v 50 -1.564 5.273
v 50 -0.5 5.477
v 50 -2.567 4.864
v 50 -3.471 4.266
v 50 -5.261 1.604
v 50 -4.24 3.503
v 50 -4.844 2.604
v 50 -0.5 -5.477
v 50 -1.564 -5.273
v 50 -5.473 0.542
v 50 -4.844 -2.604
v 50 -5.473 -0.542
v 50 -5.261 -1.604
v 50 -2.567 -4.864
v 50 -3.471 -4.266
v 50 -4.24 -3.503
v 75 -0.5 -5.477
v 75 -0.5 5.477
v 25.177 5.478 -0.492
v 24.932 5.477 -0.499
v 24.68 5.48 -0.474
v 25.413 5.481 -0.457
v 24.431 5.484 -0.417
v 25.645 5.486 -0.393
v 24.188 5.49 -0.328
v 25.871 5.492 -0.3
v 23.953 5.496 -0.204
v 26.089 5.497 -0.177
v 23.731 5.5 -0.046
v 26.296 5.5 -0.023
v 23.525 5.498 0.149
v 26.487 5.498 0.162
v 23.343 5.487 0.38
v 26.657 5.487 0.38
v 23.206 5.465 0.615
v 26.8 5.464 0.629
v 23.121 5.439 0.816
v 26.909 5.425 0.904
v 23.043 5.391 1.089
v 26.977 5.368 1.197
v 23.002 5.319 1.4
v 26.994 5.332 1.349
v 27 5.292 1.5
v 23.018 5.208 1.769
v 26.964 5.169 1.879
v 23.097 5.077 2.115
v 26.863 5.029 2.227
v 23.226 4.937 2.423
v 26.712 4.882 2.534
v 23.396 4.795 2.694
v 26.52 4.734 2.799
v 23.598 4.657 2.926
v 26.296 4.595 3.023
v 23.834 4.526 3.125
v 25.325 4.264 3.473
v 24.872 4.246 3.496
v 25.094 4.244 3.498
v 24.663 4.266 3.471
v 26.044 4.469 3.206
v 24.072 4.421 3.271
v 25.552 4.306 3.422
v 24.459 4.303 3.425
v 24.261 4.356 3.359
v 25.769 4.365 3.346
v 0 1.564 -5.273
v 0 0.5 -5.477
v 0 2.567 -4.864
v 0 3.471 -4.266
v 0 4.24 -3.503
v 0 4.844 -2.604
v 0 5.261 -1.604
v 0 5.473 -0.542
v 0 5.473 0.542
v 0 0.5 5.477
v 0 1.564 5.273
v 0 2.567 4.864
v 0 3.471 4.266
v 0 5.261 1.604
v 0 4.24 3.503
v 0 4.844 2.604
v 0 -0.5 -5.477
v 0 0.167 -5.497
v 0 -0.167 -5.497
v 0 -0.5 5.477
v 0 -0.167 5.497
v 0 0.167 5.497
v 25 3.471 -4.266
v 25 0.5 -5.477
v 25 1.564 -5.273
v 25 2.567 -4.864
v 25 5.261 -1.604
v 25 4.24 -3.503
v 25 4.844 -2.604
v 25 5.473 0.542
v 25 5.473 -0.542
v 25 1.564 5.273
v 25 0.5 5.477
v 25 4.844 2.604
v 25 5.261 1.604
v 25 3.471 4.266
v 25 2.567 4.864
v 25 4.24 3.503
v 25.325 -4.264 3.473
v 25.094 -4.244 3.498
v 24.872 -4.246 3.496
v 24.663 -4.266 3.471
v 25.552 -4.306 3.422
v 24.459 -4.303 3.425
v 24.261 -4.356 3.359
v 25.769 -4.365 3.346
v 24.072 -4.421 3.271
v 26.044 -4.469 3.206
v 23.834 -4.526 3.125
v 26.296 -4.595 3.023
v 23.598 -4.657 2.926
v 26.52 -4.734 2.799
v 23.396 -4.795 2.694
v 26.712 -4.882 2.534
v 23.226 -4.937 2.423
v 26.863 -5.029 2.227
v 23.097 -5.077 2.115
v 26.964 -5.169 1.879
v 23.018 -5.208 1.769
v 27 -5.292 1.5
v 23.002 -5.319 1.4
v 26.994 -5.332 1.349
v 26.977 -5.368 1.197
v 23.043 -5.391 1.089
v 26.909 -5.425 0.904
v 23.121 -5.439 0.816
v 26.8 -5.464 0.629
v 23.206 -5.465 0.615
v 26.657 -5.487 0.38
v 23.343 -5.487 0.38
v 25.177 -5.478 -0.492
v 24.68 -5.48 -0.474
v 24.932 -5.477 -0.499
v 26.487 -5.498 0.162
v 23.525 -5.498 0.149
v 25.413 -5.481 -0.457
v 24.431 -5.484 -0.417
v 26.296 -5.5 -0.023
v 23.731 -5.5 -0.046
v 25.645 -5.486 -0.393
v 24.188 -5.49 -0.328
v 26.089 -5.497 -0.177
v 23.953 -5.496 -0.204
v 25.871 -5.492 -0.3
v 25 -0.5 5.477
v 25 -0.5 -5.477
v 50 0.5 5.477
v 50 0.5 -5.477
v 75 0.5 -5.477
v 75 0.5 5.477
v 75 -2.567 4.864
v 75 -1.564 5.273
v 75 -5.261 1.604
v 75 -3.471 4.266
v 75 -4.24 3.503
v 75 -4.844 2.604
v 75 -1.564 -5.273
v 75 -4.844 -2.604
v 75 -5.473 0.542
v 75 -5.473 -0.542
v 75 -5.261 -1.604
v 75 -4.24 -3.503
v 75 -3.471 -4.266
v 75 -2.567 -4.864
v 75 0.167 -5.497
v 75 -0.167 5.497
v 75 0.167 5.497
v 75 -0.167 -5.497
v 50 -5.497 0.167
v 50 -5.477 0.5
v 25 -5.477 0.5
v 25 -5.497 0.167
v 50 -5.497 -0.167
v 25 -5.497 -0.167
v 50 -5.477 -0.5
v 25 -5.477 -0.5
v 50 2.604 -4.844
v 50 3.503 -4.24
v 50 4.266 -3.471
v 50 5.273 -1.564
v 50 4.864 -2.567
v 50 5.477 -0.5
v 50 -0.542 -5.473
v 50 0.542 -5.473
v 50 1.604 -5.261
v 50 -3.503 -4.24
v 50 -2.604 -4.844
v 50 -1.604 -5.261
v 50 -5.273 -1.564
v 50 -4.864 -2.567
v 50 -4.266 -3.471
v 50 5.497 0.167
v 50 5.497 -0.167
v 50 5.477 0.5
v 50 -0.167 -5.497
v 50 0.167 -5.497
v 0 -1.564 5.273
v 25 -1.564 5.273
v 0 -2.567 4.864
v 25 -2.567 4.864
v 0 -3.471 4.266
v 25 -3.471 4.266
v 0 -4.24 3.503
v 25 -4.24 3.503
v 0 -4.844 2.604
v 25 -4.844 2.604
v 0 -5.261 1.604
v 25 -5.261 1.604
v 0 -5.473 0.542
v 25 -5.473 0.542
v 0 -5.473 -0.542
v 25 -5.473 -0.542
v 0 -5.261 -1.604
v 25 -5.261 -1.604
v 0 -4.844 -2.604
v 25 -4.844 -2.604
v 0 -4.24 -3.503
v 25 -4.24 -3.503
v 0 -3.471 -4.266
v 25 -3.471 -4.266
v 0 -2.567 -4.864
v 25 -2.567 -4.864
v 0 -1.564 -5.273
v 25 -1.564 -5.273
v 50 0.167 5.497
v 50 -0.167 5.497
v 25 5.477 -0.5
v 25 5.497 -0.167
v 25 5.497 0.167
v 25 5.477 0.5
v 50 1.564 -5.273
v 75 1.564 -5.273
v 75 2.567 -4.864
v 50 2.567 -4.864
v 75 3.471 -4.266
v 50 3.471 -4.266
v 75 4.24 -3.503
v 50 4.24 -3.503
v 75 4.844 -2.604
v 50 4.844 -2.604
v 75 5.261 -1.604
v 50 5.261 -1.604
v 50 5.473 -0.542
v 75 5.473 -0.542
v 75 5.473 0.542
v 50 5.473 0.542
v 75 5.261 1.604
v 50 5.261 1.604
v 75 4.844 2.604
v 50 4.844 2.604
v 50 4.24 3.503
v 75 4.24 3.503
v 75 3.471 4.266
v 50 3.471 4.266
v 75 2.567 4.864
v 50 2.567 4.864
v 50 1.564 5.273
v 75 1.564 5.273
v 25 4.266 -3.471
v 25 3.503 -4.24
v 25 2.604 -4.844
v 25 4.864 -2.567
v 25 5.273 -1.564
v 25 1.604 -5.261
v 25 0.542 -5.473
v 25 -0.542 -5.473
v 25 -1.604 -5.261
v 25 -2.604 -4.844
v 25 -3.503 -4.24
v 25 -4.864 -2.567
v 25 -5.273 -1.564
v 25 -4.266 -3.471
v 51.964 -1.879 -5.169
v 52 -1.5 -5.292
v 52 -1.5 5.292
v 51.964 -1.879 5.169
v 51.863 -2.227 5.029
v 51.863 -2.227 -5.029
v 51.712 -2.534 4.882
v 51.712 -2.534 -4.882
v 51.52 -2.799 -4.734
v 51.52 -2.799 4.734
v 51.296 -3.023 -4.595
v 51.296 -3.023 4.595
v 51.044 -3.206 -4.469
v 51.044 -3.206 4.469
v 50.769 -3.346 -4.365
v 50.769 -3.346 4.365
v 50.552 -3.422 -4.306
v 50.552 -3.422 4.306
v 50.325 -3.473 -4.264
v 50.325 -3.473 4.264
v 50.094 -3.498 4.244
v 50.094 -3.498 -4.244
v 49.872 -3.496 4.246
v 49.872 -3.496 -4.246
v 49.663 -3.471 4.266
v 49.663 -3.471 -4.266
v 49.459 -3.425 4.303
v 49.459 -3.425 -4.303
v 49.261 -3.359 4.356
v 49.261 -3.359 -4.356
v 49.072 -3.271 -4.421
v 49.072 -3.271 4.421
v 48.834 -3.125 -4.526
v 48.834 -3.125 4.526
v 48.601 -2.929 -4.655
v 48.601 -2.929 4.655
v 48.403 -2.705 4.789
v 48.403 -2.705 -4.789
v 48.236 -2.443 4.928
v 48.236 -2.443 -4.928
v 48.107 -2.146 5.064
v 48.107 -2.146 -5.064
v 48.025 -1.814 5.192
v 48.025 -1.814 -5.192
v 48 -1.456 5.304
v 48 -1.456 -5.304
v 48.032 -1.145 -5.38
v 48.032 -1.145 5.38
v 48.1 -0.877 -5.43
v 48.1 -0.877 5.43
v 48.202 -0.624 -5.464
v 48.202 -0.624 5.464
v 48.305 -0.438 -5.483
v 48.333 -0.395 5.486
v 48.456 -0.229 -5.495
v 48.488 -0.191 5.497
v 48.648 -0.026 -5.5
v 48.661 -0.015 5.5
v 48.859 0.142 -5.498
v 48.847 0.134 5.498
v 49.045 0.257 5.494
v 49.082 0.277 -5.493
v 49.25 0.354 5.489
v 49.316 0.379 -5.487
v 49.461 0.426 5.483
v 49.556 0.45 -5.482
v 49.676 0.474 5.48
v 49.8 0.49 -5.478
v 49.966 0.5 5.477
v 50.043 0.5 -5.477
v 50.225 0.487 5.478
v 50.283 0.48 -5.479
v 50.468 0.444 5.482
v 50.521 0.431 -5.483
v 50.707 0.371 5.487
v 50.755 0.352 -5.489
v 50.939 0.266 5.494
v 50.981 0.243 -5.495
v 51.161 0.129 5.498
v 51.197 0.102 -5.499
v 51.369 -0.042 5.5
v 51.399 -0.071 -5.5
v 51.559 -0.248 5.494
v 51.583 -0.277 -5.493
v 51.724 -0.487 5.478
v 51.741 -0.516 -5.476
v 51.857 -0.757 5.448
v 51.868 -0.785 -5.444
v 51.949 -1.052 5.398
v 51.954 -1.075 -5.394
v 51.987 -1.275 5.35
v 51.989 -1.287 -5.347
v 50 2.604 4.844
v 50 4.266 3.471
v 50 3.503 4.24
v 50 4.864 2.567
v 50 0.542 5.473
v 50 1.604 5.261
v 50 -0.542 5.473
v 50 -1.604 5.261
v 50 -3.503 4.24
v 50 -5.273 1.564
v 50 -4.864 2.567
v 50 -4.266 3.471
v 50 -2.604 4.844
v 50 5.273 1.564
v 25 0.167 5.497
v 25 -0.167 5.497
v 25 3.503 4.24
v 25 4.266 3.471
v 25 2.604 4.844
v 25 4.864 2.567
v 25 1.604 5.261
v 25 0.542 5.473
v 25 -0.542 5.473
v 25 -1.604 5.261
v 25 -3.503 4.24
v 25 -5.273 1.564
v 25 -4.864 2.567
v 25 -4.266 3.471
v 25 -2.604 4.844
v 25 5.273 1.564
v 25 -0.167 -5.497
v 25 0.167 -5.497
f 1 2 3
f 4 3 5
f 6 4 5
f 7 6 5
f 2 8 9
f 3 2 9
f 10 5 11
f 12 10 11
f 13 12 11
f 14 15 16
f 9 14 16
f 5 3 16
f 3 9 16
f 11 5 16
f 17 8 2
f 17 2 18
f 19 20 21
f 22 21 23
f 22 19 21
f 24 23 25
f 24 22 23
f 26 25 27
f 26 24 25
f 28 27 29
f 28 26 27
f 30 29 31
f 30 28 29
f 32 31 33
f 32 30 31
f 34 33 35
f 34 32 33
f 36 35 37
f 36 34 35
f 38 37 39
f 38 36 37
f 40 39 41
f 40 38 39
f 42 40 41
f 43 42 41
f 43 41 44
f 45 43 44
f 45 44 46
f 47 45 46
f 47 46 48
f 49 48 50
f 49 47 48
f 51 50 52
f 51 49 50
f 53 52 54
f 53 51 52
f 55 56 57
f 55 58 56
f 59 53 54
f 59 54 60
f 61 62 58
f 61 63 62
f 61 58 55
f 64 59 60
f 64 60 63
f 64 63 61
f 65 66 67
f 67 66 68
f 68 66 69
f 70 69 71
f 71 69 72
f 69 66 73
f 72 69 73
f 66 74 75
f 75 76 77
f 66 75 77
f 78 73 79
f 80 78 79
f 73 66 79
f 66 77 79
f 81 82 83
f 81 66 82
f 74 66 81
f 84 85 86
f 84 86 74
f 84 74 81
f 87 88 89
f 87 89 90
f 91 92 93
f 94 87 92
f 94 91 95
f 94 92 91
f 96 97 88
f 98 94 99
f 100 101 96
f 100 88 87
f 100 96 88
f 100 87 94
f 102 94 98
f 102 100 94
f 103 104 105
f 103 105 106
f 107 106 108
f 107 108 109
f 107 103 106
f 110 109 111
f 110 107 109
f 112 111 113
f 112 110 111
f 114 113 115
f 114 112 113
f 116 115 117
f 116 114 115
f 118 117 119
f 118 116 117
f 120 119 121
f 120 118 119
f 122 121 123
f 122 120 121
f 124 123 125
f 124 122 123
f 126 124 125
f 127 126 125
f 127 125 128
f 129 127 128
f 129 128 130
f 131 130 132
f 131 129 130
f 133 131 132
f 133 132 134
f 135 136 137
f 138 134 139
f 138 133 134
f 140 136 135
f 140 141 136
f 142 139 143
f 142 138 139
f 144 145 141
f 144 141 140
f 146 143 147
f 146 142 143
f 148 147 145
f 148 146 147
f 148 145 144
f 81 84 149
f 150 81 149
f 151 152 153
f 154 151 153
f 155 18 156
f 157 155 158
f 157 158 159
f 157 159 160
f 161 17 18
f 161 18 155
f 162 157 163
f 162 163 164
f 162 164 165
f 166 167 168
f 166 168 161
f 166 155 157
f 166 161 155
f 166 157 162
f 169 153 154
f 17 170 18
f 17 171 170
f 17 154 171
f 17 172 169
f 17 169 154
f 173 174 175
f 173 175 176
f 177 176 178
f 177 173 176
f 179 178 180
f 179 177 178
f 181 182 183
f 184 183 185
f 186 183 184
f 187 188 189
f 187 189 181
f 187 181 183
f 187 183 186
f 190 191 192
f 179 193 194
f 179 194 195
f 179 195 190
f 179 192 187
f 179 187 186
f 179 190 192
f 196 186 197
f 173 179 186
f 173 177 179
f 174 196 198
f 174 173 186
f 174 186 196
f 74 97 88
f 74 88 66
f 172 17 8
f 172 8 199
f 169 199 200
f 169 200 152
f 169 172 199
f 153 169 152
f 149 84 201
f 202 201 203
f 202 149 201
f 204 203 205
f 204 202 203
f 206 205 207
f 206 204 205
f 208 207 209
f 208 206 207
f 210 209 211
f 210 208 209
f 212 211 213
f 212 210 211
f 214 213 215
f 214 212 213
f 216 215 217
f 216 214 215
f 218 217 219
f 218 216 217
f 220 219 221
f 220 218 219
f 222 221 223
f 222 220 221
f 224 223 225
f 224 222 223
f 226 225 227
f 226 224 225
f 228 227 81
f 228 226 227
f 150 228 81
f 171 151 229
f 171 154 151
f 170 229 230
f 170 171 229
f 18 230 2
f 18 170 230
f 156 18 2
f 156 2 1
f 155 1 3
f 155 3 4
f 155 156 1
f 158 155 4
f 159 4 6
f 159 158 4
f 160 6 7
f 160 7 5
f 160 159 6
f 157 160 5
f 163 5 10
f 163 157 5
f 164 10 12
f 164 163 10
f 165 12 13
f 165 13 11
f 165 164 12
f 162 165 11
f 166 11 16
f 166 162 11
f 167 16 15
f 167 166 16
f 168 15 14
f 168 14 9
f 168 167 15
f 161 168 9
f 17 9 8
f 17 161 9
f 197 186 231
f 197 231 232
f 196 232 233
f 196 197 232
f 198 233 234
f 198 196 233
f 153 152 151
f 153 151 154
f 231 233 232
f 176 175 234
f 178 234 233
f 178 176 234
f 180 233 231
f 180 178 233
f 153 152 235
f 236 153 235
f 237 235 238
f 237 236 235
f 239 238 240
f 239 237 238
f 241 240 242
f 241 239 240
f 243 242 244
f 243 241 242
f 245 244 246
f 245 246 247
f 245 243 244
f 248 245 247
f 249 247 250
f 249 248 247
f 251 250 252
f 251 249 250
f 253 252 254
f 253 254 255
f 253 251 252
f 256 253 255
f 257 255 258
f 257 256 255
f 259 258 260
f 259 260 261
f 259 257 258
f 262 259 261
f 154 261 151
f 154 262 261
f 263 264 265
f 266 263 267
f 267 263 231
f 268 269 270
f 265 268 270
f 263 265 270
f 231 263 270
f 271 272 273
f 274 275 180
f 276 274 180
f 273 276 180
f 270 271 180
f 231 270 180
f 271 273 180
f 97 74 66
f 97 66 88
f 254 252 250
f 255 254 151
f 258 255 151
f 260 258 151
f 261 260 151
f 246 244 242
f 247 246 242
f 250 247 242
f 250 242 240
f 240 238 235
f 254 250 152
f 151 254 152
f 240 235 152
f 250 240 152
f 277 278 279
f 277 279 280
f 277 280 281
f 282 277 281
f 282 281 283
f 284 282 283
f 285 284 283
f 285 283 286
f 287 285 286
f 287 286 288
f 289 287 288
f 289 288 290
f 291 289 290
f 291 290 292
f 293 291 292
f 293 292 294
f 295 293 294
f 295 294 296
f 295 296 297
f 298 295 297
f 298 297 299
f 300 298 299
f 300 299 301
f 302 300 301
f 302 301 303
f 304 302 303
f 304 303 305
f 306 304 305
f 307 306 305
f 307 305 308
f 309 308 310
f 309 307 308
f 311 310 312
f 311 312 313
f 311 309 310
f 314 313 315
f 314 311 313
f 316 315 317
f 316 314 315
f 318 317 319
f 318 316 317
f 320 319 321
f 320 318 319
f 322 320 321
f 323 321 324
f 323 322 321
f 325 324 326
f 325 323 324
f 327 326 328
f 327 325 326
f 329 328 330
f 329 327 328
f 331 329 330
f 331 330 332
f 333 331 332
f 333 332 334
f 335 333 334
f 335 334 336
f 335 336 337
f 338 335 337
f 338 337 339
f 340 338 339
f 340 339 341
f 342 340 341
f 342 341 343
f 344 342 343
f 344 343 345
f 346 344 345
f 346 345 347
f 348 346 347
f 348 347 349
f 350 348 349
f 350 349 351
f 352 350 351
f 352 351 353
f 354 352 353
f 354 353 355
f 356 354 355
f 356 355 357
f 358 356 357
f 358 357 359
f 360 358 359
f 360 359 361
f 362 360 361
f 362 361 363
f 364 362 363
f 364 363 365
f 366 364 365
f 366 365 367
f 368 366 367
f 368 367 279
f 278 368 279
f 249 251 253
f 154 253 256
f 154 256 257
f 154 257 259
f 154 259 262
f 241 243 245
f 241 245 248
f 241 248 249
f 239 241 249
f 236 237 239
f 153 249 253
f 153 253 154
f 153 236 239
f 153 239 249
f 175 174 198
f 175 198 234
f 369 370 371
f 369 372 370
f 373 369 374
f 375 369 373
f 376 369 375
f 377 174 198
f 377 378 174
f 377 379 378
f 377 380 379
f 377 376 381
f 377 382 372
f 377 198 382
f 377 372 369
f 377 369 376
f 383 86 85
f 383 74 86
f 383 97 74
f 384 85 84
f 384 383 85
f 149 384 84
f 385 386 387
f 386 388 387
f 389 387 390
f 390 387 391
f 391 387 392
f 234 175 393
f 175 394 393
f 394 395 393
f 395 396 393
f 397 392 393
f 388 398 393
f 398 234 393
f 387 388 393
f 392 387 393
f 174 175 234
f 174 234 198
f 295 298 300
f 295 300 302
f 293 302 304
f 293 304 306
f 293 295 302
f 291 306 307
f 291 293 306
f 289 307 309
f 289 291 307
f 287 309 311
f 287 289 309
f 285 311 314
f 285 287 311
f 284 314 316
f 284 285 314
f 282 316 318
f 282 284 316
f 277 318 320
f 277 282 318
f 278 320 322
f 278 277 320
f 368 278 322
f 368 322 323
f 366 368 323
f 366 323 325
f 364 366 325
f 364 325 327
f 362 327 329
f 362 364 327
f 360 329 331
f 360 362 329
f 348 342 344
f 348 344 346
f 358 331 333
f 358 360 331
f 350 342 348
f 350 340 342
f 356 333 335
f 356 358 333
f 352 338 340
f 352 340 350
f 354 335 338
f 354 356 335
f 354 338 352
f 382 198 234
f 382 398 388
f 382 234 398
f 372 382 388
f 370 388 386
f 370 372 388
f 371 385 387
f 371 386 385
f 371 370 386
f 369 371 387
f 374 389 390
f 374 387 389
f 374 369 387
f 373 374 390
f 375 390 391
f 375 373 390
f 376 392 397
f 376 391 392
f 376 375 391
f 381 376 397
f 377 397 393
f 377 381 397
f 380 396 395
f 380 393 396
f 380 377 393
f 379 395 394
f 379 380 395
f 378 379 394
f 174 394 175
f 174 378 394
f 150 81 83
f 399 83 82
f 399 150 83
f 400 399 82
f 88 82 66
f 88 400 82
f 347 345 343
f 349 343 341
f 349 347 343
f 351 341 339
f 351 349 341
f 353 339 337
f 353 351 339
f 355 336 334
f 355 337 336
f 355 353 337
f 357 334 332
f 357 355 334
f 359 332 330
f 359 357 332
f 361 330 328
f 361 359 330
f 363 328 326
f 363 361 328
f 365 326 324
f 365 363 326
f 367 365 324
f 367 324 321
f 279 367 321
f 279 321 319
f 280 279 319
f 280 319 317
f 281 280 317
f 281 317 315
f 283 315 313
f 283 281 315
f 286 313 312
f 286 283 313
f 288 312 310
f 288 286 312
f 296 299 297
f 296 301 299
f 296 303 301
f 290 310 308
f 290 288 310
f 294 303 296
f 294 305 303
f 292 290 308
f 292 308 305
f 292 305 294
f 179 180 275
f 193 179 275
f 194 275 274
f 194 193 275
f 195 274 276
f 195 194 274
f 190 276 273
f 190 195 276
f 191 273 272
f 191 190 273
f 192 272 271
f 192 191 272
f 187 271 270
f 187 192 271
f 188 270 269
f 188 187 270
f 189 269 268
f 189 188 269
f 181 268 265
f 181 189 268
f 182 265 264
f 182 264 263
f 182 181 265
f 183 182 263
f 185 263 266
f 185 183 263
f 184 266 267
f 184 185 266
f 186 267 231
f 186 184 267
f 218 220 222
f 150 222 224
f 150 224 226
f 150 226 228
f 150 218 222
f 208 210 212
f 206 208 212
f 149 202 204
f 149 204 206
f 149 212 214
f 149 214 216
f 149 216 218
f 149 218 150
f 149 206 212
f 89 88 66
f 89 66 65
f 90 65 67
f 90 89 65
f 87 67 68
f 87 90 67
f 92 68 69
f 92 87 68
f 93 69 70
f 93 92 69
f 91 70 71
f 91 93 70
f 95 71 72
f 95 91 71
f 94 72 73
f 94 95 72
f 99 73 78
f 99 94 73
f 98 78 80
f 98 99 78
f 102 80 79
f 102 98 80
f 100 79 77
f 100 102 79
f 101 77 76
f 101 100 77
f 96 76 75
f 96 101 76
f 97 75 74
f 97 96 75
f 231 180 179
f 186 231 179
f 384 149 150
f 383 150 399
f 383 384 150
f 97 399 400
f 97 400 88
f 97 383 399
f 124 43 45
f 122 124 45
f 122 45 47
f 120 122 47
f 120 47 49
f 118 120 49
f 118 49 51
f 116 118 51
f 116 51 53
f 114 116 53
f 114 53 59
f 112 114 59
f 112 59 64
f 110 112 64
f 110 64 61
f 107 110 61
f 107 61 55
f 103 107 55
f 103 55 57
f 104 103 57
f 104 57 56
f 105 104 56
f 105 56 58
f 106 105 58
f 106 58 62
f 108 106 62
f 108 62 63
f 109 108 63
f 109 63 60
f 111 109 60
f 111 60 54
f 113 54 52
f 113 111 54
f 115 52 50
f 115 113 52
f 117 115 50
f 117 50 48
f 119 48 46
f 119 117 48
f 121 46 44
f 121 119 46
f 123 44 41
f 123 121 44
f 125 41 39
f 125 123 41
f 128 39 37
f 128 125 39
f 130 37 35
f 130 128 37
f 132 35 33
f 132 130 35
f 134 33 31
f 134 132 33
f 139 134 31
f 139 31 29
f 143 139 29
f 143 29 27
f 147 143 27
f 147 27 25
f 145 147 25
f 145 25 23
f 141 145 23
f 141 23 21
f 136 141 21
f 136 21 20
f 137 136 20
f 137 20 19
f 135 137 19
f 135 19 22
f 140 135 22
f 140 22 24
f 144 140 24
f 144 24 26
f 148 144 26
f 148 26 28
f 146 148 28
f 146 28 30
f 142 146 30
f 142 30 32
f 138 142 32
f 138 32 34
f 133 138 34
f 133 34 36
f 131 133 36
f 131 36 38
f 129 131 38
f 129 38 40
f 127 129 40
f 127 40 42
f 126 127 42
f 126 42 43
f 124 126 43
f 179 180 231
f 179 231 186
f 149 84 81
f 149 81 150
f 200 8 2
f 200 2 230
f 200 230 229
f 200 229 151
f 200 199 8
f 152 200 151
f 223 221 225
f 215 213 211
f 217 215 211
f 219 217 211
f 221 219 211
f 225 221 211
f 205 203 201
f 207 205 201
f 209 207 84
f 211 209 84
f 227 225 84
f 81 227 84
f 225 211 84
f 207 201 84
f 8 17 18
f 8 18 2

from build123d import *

# Parameters (mm, degrees)
F0_W     = 25
F0_H     = 9.5
F1_DEPTH = 10
F2_DEPTH = 10
F5_ANGLE = 90
F6_R     = 2
F7_DEPTH = 20
F9_ANGLE = 90
F10_W    = 77
F10_H    = 5.5


with BuildPart() as f1:
    # F0 (on Top) → F1 (new body, symmetric)
    with BuildSketch(Plane.XY):
        with Locations((12.5, -5.25)):
            Rectangle(F0_W, F0_H)
    extrude(amount=F1_DEPTH, both=True)


with BuildPart() as f1b:
    # F0 (on Top) → F1, piece 2 (new body, symmetric)
    with BuildSketch(Plane.XY):
        with Locations((12.5, 5.25)):
            Rectangle(F0_W, F0_H)
    extrude(amount=F1_DEPTH, both=True)


with BuildPart() as f2:
    # F0 (on Top) → F2 (new body, symmetric)
    with BuildSketch(Plane.XY):
        Polygon((0, 0.5), (0, 0), (0, -0.5), (25, -0.5), (25, 0.5), align=None)
    extrude(amount=F2_DEPTH, both=True)


with BuildPart() as f3_1:
    # F3: copy of F1
    add(f1.part.moved(Location((25, 0, 0))))


with BuildPart() as f3_2:
    # F3: copy of F1b
    add(f1b.part.moved(Location((25, 0, 0))))


with BuildPart() as f3_3:
    # F3: copy of F2
    add(f2.part.moved(Location((25, 0, 0))))


with BuildPart() as f3_2_1:
    # F5: moved
    add(f3_2.part.rotate(Axis((36.7808852345, 0, 0), (1, 0, 0)), F5_ANGLE))


with BuildPart() as f3_3_1:
    # F5: moved
    add(f3_3.part.rotate(Axis((36.7808852345, 0, 0), (1, 0, 0)), F5_ANGLE))


with BuildPart() as f3_1_1:
    # F5: moved
    add(f3_1.part.rotate(Axis((36.7808852345, 0, 0), (1, 0, 0)), F5_ANGLE))


with BuildPart() as f7:
    # F6 (on face) → F7 (new body)
    with BuildSketch(Plane.XZ.offset(10)):
        with Locations((25, 1.5)):
            Circle(F6_R)
    extrude(amount=-F7_DEPTH)


with BuildPart() as f8_1:
    # F8: copy of F3_2
    add(f3_2_1.part.moved(Location((25, 0, 0))))


with BuildPart() as f8_2:
    # F8: copy of F3_3
    add(f3_3_1.part.moved(Location((25, 0, 0))))


with BuildPart() as f8_3:
    # F8: copy of F3_1
    add(f3_1_1.part.moved(Location((25, 0, 0))))


with BuildPart() as f8_4:
    # F8: copy of F7
    add(f7.part.moved(Location((25, 0, 0))))


with BuildPart() as f8_4_1:
    # F9: moved
    add(f8_4.part.rotate(Axis((36.7808852345, 0, 0), (1, 0, 0)), F9_ANGLE))


with BuildPart() as f8_1_1:
    # F9: moved
    add(f8_1.part.rotate(Axis((36.7808852345, 0, 0), (1, 0, 0)), F9_ANGLE))


with BuildPart() as f8_2_1:
    # F9: moved
    add(f8_2.part.rotate(Axis((36.7808852345, 0, 0), (1, 0, 0)), F9_ANGLE))


with BuildPart() as f8_3_1:
    # F9: moved
    add(f8_3.part.rotate(Axis((36.7808852345, 0, 0), (1, 0, 0)), F9_ANGLE))


with BuildPart() as f11_tool:
    # F10 (on Front) → F11 (revolve)
    with BuildSketch(Plane.XZ):
        with Locations((38.5, 2.75)):
            Rectangle(F10_W, F10_H)
    revolve(axis=Axis((36.7808852345, 0, 0), (1, 0, 0)))


with BuildPart() as f1_1:
    add(f1.part)

    # F11: intersect by f11_tool
    add(f11_tool.part, mode=Mode.INTERSECT)


with BuildPart() as f1b_1:
    add(f1b.part)

    # F11: intersect by f11_tool
    add(f11_tool.part, mode=Mode.INTERSECT)


with BuildPart() as f2_1:
    add(f2.part)

    # F11: intersect by f11_tool
    add(f11_tool.part, mode=Mode.INTERSECT)


with BuildPart() as f3_1_2:
    add(f3_1_1.part)

    # F11: intersect by f11_tool
    add(f11_tool.part, mode=Mode.INTERSECT)


with BuildPart() as f3_2_2:
    add(f3_2_1.part)

    # F11: intersect by f11_tool
    add(f11_tool.part, mode=Mode.INTERSECT)


with BuildPart() as f3_3_2:
    add(f3_3_1.part)

    # F11: intersect by f11_tool
    add(f11_tool.part, mode=Mode.INTERSECT)


with BuildPart() as f7_1:
    add(f7.part)

    # F11: intersect by f11_tool
    add(f11_tool.part, mode=Mode.INTERSECT)


with BuildPart() as f8_1_2:
    add(f8_1_1.part)

    # F11: intersect by f11_tool
    add(f11_tool.part, mode=Mode.INTERSECT)


with BuildPart() as f8_2_2:
    add(f8_2_1.part)

    # F11: intersect by f11_tool
    add(f11_tool.part, mode=Mode.INTERSECT)


with BuildPart() as f8_3_2:
    add(f8_3_1.part)

    # F11: intersect by f11_tool
    add(f11_tool.part, mode=Mode.INTERSECT)


with BuildPart() as f8_4_2:
    add(f8_4_1.part)

    # F11: intersect by f11_tool
    add(f11_tool.part, mode=Mode.INTERSECT)


solid = Compound([f1_1.part, f1b_1.part, f2_1.part, f3_1_2.part, f3_2_2.part, f3_3_2.part, f7_1.part, f8_1_2.part, f8_2_2.part, f8_3_2.part, f8_4_2.part])
